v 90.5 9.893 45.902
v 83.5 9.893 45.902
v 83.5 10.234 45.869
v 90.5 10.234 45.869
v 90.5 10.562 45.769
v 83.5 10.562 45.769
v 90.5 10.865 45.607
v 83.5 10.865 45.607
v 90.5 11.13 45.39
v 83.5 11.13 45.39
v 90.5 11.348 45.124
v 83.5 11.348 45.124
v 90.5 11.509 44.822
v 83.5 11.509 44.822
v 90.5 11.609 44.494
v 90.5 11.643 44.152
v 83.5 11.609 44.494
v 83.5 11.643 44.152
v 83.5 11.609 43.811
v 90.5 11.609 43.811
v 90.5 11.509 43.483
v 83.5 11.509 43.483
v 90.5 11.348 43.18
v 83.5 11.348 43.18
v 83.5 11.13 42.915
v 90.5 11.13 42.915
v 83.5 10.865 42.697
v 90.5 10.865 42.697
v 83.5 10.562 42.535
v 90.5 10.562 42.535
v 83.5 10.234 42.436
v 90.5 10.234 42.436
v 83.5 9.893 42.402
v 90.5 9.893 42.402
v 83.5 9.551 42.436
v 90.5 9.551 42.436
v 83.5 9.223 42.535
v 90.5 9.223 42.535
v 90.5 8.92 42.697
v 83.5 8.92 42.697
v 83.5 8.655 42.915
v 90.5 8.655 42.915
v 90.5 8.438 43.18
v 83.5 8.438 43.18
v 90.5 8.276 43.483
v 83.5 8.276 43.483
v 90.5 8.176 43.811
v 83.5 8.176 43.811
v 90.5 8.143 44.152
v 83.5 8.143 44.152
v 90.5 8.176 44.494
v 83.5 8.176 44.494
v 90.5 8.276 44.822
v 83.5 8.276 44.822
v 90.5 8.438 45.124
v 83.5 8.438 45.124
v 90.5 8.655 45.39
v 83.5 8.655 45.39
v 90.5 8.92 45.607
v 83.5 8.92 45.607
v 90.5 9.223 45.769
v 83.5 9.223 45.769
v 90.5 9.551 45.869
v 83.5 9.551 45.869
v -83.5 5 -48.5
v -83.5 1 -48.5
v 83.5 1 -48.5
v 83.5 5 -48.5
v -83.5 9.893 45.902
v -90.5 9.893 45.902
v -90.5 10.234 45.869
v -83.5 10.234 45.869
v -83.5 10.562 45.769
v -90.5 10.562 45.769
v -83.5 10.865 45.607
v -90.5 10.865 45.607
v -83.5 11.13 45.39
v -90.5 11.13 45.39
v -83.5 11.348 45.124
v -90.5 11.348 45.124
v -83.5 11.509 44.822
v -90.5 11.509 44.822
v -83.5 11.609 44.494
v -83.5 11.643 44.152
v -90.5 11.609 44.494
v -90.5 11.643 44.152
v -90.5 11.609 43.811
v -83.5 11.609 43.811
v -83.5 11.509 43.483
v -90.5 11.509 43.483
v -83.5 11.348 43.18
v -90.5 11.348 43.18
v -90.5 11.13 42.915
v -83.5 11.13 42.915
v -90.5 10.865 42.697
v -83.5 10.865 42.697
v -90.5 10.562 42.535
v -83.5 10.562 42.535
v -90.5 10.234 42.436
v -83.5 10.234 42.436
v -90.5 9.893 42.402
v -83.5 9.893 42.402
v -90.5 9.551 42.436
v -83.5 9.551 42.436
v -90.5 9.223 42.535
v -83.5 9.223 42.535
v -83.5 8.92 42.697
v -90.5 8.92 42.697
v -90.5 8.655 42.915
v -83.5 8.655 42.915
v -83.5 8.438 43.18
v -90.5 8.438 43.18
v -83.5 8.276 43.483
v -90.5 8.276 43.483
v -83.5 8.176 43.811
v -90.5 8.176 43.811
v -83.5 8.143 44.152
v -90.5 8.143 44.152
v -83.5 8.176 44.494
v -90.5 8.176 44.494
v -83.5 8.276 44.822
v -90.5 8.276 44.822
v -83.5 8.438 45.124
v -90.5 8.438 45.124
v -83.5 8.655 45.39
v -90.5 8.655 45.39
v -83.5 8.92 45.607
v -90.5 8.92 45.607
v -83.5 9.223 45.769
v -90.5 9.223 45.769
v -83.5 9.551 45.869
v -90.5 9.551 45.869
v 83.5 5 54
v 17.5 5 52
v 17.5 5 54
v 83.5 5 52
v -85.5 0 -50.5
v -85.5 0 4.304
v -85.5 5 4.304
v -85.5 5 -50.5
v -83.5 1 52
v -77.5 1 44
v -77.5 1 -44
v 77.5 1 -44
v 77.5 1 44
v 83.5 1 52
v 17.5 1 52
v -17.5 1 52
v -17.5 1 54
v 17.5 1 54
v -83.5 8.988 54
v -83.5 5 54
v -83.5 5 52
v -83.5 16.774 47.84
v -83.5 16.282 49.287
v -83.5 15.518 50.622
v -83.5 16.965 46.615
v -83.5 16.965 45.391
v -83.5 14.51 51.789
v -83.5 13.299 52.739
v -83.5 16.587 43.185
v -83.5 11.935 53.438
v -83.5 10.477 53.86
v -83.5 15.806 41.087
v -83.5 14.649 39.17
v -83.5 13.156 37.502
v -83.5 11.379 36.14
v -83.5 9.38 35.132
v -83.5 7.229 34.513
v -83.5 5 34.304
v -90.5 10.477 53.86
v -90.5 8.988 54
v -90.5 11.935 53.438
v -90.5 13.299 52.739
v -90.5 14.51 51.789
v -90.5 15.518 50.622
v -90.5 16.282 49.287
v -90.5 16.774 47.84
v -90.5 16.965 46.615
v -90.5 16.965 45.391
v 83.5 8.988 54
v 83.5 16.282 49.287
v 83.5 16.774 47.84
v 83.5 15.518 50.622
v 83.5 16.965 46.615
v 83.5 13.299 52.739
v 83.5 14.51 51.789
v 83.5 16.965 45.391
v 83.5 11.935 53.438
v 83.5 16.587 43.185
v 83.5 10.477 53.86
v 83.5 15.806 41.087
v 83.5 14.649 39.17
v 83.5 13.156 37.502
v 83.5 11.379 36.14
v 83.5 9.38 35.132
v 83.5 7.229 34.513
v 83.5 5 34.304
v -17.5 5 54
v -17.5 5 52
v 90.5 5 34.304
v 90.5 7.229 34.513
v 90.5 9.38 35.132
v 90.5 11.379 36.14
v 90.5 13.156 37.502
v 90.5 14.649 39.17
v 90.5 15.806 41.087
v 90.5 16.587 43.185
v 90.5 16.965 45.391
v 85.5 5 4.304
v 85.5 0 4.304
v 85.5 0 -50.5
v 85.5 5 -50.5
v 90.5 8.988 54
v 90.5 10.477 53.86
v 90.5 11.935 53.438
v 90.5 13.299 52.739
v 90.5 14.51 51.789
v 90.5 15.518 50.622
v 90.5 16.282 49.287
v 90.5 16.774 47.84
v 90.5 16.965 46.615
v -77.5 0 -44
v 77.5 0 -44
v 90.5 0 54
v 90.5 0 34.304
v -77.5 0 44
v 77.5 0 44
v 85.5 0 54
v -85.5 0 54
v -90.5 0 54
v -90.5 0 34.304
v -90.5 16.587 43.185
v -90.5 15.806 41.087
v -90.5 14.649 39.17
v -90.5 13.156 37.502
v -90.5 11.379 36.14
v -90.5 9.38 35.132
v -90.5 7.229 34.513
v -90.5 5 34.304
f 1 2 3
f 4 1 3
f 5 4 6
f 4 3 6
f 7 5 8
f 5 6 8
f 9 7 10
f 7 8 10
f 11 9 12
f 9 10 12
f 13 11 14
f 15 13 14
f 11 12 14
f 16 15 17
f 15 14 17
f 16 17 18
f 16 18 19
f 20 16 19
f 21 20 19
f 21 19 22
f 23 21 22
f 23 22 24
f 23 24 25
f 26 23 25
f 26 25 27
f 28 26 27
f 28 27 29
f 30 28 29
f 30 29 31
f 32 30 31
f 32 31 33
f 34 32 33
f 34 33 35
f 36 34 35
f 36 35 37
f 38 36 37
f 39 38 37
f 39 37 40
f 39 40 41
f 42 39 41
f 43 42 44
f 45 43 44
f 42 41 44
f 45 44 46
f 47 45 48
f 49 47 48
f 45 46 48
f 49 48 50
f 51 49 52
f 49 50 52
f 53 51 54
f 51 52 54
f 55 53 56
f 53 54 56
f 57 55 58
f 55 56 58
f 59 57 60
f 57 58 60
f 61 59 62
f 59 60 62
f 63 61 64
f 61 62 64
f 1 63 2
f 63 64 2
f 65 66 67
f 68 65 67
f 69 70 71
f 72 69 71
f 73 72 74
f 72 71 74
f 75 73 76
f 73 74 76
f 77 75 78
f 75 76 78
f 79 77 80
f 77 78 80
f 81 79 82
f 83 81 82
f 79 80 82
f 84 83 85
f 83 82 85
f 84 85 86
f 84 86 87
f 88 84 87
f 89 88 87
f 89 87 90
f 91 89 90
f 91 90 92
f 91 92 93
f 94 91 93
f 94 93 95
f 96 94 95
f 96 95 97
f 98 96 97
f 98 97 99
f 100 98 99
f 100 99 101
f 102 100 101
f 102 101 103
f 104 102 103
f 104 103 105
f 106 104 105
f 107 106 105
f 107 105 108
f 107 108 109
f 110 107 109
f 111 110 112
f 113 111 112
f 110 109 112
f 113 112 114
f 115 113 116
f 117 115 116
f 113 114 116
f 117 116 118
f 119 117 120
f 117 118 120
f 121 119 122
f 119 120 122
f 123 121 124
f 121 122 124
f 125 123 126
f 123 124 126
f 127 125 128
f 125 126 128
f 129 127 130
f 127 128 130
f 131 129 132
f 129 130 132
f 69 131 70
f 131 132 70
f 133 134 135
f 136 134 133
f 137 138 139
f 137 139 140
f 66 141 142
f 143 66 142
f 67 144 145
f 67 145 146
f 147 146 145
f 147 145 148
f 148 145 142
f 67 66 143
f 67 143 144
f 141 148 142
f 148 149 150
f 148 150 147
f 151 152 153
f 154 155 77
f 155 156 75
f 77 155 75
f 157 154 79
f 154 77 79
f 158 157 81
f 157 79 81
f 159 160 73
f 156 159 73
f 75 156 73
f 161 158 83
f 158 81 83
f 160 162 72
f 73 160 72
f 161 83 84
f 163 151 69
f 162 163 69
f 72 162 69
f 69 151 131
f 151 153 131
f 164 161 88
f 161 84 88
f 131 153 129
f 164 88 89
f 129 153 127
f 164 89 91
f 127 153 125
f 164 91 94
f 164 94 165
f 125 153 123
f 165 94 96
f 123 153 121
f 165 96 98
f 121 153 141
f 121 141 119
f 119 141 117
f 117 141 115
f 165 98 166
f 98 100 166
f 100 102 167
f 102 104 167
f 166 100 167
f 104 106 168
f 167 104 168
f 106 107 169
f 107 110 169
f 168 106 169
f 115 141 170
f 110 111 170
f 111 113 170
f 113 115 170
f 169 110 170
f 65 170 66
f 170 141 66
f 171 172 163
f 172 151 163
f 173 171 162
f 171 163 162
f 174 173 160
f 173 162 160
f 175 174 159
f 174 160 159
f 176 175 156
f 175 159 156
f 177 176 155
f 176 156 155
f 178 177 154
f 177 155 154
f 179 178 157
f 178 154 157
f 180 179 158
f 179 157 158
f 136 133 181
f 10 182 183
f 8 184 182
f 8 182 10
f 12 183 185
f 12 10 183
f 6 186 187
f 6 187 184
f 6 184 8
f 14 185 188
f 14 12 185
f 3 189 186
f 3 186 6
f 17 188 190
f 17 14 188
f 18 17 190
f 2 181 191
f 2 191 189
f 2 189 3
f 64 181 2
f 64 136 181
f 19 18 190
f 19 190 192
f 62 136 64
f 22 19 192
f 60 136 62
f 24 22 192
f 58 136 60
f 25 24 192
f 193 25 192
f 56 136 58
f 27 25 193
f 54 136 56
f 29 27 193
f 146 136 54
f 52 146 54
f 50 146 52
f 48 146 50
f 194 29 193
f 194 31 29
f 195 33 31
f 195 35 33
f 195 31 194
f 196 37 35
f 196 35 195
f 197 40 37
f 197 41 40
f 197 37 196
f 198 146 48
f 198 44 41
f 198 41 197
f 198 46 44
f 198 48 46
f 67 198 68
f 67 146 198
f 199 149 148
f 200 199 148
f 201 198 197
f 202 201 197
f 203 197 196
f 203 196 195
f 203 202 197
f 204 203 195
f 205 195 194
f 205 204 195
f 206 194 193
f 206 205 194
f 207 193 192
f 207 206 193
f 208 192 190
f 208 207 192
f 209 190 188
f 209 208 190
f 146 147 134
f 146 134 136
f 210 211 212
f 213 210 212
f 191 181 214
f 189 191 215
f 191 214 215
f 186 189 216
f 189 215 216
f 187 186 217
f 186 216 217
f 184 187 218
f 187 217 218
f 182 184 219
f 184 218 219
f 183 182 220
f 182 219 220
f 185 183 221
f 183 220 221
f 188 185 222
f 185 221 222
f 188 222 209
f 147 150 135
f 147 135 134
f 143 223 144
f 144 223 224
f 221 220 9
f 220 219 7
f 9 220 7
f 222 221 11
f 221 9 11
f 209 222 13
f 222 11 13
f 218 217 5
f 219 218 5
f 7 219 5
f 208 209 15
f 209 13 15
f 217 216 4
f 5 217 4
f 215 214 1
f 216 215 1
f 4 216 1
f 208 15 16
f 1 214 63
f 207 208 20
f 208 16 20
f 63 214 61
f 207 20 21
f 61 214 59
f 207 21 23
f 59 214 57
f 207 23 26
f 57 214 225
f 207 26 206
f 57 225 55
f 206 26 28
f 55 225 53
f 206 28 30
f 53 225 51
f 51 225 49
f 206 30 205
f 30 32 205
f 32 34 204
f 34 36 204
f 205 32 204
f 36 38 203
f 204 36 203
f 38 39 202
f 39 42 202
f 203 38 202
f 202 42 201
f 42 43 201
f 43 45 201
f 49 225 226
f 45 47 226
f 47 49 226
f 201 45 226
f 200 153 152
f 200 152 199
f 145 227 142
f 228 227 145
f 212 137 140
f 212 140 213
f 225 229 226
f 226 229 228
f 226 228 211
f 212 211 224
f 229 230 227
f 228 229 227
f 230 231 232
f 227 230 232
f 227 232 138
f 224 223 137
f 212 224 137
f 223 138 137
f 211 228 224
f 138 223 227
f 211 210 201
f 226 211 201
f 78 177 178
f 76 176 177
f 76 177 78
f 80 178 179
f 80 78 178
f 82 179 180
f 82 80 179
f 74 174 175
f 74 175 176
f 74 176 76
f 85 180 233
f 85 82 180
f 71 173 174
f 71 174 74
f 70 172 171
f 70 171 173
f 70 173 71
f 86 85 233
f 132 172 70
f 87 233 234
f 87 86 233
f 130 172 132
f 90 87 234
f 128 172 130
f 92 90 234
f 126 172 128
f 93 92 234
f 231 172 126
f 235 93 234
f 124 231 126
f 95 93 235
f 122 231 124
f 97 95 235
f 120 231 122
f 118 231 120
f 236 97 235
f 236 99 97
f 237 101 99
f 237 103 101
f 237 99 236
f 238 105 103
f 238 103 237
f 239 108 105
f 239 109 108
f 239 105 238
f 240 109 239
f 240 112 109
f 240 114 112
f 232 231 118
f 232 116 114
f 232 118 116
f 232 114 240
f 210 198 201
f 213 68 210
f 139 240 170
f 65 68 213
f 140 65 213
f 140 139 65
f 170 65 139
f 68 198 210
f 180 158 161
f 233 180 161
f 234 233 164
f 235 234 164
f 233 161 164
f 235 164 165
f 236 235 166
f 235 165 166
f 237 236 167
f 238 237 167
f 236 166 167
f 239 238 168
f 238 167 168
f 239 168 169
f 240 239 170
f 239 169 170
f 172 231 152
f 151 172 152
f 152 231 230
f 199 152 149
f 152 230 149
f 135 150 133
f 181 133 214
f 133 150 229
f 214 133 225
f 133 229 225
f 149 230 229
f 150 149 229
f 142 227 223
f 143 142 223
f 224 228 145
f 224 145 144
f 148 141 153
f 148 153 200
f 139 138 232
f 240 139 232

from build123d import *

# Parameters (mm, degrees)
SKETCH1_W                = 171
SKETCH1_H                = 104.5
SKETCH1_W_2              = 155
SKETCH1_H_2              = 88
BOSS_EXTRUDE1_DEPTH      = 1
SKETCH2_W                = 171
SKETCH2_H                = 104.5
SKETCH2_W_2              = 167
SKETCH2_H_2              = 100.5
BOSS_EXTRUDE2_DEPTH      = 4
SKETCH3_W                = 35
SKETCH3_H                = 8.699372258
CUT_EXTRUDE1_DEPTH       = 14
BOSS_EXTRUDE3_DEPTH      = 16
BOSS_EXTRUDE3_DEPTH_BACK = 1
SKETCH4_W                = 7
SKETCH4_H                = 19.695550369
FILLET1_R                = 12
CHAMFER1_SIZE            = 30
CHAMFER1_SIZE_2          = 5
FILLET2_R                = 8
SKETCH5_R                = 1.75
CUT_EXTRUDE2_DEPTH       = 216


with BuildPart() as part:
    # Sketch1 → Boss-Extrude1 (new body)
    with BuildSketch(Plane(origin=(0, 0, 0), x_dir=(1, 0, 0), z_dir=(0, 1, 0))):
        with Locations((0, -1.75)):
            Rectangle(SKETCH1_W, SKETCH1_H)
        Rectangle(SKETCH1_W_2, SKETCH1_H_2, mode=Mode.SUBTRACT)
    extrude(amount=BOSS_EXTRUDE1_DEPTH)

    # Sketch2 → Boss-Extrude2 (add)
    with BuildSketch(Plane(origin=(0, 1, 0), x_dir=(1, 0, 0), z_dir=(0, 1, 0))):
        with Locations((0, -1.75)):
            Rectangle(SKETCH2_W, SKETCH2_H)
        with Locations((0, -1.75)):
            Rectangle(SKETCH2_W_2, SKETCH2_H_2, mode=Mode.SUBTRACT)
    extrude(amount=BOSS_EXTRUDE2_DEPTH)

    # Sketch3 → Cut-Extrude1 (cut)
    with BuildSketch(Plane(origin=(0, 1, 0), x_dir=(1, 0, 0), z_dir=(0, 1, 0))):
        with Locations((0, -52)):
            Rectangle(SKETCH3_W, SKETCH3_H)
    extrude(amount=CUT_EXTRUDE1_DEPTH, mode=Mode.SUBTRACT)

    # Sketch4 → Boss-Extrude3 (add, two sides: drawn at the far end of the back side and taken through both)
    with BuildSketch(Plane(origin=(0, 1, 0), x_dir=(1, 0, 0), z_dir=(0, 1, 0)).offset(-BOSS_EXTRUDE3_DEPTH_BACK)):
        with Locations((-87, -44.152224816)):
            Rectangle(SKETCH4_W, SKETCH4_H)
        with Locations((87, -44.152224816)):
            Rectangle(SKETCH4_W, SKETCH4_H)
    extrude(amount=BOSS_EXTRUDE3_DEPTH + BOSS_EXTRUDE3_DEPTH_BACK)

    # Fillet1
    fillet1_edges = [part.edges().sort_by_distance(p)[0] for p in [
        (87, 17, 34.304449631),
        (-87, 17, 34.304449631),
    ]]
    fillet(fillet1_edges, radius=FILLET1_R)

    # Chamfer1
    # the kernel refuses this chamfer: 30, 5 mm, written as the material it adds along each edge
    with BuildSketch(Plane(origin=(85.5, 5, 34.304449631), x_dir=(-0.006326222023777661, 0, -0.999979989257238), z_dir=(0, -1, 0))) as chamfer1_piece_1_section:
        Polygon((CHAMFER1_SIZE * 0.999979989257, CHAMFER1_SIZE * 0.00632622202378), (-CHAMFER1_SIZE_2 * 0.00632622202378, CHAMFER1_SIZE_2 * 0.999979989257), (0, 0), align=None)
    chamfer1_piece_1 = extrude(amount=5, mode=Mode.PRIVATE)
    chamfer1_piece_1 = split(chamfer1_piece_1, bisect_by=Plane(origin=(90.5, 2.5, 23.467018092), z_dir=(-1, 0, 0)), keep=Keep.TOP, mode=Mode.PRIVATE)
    add(chamfer1_piece_1)
    with BuildSketch(Plane(origin=(-85.5, 0, 34.304449631), x_dir=(0.006326222023777661, 0, -0.999979989257238), z_dir=(0, 1, 0))) as chamfer1_piece_2_section:
        Polygon((CHAMFER1_SIZE * 0.999979989257, CHAMFER1_SIZE * 0.00632622202378), (-CHAMFER1_SIZE_2 * 0.00632622202378, CHAMFER1_SIZE_2 * 0.999979989257), (0, 0), align=None)
    chamfer1_piece_2 = extrude(amount=5, mode=Mode.PRIVATE)
    chamfer1_piece_2 = split(chamfer1_piece_2, bisect_by=Plane(origin=(-90.5, 2.5, 23.467018092), z_dir=(1, 0, 0)), keep=Keep.TOP, mode=Mode.PRIVATE)
    add(chamfer1_piece_2)

    # Fillet2
    fillet2_edges = [part.edges().sort_by_distance(p)[0] for p in [
        (87, 17, 54),
        (-87, 17, 54),
    ]]
    fillet(fillet2_edges, radius=FILLET2_R)

    # Sketch5 → Cut-Extrude2 (cut)
    with BuildSketch(Plane.ZY.offset(90.5)):
        with Locations((44.152224816, 9.892685603)):
            Circle(SKETCH5_R)
    extrude(amount=-CUT_EXTRUDE2_DEPTH, mode=Mode.SUBTRACT)


solid = part.part
